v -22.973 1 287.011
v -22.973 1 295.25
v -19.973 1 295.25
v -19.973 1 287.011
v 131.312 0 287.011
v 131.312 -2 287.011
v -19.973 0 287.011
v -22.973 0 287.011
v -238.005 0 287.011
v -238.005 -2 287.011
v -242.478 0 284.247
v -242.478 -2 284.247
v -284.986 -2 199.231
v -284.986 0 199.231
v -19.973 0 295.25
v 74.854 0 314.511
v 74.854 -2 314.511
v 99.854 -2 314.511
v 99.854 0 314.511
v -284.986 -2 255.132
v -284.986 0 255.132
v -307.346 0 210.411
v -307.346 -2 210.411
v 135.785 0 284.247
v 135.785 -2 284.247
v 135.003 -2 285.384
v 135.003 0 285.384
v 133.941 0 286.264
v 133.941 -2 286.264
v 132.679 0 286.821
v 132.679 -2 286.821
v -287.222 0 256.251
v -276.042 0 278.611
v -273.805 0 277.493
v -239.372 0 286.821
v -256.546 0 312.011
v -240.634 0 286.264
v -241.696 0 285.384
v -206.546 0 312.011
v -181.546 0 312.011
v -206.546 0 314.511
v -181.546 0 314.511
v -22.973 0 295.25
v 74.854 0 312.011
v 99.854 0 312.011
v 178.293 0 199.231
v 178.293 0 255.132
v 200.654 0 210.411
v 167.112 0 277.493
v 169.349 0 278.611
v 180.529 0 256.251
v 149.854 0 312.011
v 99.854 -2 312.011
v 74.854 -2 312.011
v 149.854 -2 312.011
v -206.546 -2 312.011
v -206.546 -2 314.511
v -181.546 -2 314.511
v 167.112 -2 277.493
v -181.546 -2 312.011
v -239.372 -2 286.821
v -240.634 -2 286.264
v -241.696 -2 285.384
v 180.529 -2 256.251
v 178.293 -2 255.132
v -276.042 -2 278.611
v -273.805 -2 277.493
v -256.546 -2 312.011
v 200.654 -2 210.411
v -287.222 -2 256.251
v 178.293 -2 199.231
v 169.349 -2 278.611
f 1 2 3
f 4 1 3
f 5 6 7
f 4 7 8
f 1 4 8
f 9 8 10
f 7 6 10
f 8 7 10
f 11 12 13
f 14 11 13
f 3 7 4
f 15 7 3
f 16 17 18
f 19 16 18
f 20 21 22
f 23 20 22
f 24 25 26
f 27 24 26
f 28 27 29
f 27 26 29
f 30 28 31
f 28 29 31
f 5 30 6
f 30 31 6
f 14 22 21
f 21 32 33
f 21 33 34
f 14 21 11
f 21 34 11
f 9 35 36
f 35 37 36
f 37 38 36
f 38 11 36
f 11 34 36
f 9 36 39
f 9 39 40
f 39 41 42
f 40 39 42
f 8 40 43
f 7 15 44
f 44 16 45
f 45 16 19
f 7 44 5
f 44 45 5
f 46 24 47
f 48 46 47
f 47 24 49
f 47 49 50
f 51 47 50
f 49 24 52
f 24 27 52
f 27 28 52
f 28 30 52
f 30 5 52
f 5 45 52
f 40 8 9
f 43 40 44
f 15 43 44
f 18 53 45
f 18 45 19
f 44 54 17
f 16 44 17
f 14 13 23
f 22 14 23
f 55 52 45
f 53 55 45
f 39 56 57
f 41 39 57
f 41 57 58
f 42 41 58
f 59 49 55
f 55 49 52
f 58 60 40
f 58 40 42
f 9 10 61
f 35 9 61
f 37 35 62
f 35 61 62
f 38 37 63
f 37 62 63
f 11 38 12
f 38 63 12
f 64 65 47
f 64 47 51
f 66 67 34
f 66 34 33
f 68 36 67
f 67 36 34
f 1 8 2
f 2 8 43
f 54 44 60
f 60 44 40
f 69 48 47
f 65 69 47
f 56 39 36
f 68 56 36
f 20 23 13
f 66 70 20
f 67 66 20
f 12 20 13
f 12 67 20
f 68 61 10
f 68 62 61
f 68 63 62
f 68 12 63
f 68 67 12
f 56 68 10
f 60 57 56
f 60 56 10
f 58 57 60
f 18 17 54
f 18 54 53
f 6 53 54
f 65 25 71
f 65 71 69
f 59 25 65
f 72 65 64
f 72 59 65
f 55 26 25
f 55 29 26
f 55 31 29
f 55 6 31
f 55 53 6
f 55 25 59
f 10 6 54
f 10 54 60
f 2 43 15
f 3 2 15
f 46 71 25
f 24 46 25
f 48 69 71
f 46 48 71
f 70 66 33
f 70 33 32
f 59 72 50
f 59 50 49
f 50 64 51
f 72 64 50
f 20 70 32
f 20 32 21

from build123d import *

# Parameters (mm, degrees)
F1_DEPTH  = 2
F3_DEPTH  = 2.001
F4_W      = 3
F4_H      = 69.7761774063
F5_DEPTH  = 3
F7_D      = 6.6
F9_DEPTH  = 25
F10_W     = 25
F10_H     = 2.5
F11_DEPTH = 2


with BuildPart() as f1:
    # F0 (on Front) → F1 (new body)
    with BuildSketch(Plane.XZ):
        Polygon((-307.3464844827, 210.4111198679), (-307.3464844827, -195.9888801321), (200.6535155173, -195.9888801321), (200.6535155173, 210.4111198679), (149.8535155173, 312.0111198679), (-256.5464844827, 312.0111198679), align=None)
    extrude(amount=F1_DEPTH)

    # F2 (on face) → F3 (cut, through all)
    with BuildSketch(Plane.XZ.offset(2)):
        with BuildLine():
            Line((99.0535155173, 210.4111198679), (-205.7464844827, 210.4111198679))
            ThreePointArc((-205.7464844827, 210.4111198679), (-241.667508967, 195.5321443521), (-256.5464844827, 159.6111198679))
            Line((-256.5464844827, 159.6111198679), (-256.5464844827, -94.3888801321))
            ThreePointArc((-256.5464844827, -94.3888801321), (-241.667508967, -130.3099046164), (-205.7464844827, -145.1888801321))
            Line((-205.7464844827, -145.1888801321), (99.0535155173, -145.1888801321))
            ThreePointArc((99.0535155173, -145.1888801321), (134.9745400016, -130.3099046164), (149.8535155173, -94.3888801321))
            Line((149.8535155173, -94.3888801321), (149.8535155173, 159.6111198679))
            ThreePointArc((149.8535155173, 159.6111198679), (134.9745400016, 195.5321443521), (99.0535155173, 210.4111198679))
        make_face()
    extrude(amount=-F3_DEPTH, mode=Mode.SUBTRACT)

    # F4 (on face) → F5 (join)
    with BuildSketch(Plane.XZ.offset(2)):
        with Locations((-21.4731446389, 260.3619992733)):
            Rectangle(F4_W, F4_H)
    extrude(amount=-F5_DEPTH)

    # F7 (through all)
    with Locations(Plane.XZ.offset(2)):
        with Locations((-294.8464844827, 185.0111198679), (-294.8464844827, 7.2111198679), (-294.8464844827, -170.5888801321), (188.1535155173, -170.5888801321), (188.1535155173, 7.2111198679), (188.1535155173, 185.0111198679)):
            Hole(F7_D / 2)

    # F8 (on face) → F9 (cut)
    with BuildSketch(Plane.XZ.offset(2)):
        with BuildLine():
            Line((-284.9858047077, 199.2307799804), (-307.3464844827, 210.4111198679))
            Line((-307.3464844827, 210.4111198679), (-307.3464844827, -195.9888801321))
            Line((-307.3464844827, -195.9888801321), (200.6535155173, -195.9888801321))
            Line((200.6535155173, -195.9888801321), (200.6535155173, 210.4111198679))
            Line((200.6535155173, 210.4111198679), (178.2928357423, 199.2307799804))
            Line((178.2928357423, 199.2307799804), (135.7846318098, 284.2471878454))
            ThreePointArc((135.7846318098, 284.2471878454), (133.9411514154, 286.2643739096), (131.3124958548, 287.0111198679))
            Line((131.3124958548, 287.0111198679), (-238.0054648202, 287.0111198679))
            ThreePointArc((-238.0054648202, 287.0111198679), (-240.6341203808, 286.2643739096), (-242.4776007752, 284.2471878454))
            Line((-242.4776007752, 284.2471878454), (-284.9858047077, 199.2307799804))
        make_face()
    extrude(amount=-F9_DEPTH, mode=Mode.SUBTRACT)

    # F10 (on face) → F11 (join)
    with BuildSketch(Plane.XZ.offset(2)):
        with Locations((-194.0464844827, 313.2611198679)):
            Rectangle(F10_W, F10_H)
        with Locations((87.3535155173, 313.2611198679)):
            Rectangle(F10_W, F10_H)
        Polygon((-284.9858047077, 255.1324794179), (-273.8054648202, 277.4931591929), (-276.0415327977, 278.6111931816), (-287.2218726852, 256.2505134066), align=None)
        Polygon((169.3485638323, 278.6111931816), (167.1124958548, 277.4931591929), (178.2928357423, 255.1324794179), (180.5289037198, 256.2505134066), align=None)
    extrude(amount=-F11_DEPTH)


solid = f1.part
